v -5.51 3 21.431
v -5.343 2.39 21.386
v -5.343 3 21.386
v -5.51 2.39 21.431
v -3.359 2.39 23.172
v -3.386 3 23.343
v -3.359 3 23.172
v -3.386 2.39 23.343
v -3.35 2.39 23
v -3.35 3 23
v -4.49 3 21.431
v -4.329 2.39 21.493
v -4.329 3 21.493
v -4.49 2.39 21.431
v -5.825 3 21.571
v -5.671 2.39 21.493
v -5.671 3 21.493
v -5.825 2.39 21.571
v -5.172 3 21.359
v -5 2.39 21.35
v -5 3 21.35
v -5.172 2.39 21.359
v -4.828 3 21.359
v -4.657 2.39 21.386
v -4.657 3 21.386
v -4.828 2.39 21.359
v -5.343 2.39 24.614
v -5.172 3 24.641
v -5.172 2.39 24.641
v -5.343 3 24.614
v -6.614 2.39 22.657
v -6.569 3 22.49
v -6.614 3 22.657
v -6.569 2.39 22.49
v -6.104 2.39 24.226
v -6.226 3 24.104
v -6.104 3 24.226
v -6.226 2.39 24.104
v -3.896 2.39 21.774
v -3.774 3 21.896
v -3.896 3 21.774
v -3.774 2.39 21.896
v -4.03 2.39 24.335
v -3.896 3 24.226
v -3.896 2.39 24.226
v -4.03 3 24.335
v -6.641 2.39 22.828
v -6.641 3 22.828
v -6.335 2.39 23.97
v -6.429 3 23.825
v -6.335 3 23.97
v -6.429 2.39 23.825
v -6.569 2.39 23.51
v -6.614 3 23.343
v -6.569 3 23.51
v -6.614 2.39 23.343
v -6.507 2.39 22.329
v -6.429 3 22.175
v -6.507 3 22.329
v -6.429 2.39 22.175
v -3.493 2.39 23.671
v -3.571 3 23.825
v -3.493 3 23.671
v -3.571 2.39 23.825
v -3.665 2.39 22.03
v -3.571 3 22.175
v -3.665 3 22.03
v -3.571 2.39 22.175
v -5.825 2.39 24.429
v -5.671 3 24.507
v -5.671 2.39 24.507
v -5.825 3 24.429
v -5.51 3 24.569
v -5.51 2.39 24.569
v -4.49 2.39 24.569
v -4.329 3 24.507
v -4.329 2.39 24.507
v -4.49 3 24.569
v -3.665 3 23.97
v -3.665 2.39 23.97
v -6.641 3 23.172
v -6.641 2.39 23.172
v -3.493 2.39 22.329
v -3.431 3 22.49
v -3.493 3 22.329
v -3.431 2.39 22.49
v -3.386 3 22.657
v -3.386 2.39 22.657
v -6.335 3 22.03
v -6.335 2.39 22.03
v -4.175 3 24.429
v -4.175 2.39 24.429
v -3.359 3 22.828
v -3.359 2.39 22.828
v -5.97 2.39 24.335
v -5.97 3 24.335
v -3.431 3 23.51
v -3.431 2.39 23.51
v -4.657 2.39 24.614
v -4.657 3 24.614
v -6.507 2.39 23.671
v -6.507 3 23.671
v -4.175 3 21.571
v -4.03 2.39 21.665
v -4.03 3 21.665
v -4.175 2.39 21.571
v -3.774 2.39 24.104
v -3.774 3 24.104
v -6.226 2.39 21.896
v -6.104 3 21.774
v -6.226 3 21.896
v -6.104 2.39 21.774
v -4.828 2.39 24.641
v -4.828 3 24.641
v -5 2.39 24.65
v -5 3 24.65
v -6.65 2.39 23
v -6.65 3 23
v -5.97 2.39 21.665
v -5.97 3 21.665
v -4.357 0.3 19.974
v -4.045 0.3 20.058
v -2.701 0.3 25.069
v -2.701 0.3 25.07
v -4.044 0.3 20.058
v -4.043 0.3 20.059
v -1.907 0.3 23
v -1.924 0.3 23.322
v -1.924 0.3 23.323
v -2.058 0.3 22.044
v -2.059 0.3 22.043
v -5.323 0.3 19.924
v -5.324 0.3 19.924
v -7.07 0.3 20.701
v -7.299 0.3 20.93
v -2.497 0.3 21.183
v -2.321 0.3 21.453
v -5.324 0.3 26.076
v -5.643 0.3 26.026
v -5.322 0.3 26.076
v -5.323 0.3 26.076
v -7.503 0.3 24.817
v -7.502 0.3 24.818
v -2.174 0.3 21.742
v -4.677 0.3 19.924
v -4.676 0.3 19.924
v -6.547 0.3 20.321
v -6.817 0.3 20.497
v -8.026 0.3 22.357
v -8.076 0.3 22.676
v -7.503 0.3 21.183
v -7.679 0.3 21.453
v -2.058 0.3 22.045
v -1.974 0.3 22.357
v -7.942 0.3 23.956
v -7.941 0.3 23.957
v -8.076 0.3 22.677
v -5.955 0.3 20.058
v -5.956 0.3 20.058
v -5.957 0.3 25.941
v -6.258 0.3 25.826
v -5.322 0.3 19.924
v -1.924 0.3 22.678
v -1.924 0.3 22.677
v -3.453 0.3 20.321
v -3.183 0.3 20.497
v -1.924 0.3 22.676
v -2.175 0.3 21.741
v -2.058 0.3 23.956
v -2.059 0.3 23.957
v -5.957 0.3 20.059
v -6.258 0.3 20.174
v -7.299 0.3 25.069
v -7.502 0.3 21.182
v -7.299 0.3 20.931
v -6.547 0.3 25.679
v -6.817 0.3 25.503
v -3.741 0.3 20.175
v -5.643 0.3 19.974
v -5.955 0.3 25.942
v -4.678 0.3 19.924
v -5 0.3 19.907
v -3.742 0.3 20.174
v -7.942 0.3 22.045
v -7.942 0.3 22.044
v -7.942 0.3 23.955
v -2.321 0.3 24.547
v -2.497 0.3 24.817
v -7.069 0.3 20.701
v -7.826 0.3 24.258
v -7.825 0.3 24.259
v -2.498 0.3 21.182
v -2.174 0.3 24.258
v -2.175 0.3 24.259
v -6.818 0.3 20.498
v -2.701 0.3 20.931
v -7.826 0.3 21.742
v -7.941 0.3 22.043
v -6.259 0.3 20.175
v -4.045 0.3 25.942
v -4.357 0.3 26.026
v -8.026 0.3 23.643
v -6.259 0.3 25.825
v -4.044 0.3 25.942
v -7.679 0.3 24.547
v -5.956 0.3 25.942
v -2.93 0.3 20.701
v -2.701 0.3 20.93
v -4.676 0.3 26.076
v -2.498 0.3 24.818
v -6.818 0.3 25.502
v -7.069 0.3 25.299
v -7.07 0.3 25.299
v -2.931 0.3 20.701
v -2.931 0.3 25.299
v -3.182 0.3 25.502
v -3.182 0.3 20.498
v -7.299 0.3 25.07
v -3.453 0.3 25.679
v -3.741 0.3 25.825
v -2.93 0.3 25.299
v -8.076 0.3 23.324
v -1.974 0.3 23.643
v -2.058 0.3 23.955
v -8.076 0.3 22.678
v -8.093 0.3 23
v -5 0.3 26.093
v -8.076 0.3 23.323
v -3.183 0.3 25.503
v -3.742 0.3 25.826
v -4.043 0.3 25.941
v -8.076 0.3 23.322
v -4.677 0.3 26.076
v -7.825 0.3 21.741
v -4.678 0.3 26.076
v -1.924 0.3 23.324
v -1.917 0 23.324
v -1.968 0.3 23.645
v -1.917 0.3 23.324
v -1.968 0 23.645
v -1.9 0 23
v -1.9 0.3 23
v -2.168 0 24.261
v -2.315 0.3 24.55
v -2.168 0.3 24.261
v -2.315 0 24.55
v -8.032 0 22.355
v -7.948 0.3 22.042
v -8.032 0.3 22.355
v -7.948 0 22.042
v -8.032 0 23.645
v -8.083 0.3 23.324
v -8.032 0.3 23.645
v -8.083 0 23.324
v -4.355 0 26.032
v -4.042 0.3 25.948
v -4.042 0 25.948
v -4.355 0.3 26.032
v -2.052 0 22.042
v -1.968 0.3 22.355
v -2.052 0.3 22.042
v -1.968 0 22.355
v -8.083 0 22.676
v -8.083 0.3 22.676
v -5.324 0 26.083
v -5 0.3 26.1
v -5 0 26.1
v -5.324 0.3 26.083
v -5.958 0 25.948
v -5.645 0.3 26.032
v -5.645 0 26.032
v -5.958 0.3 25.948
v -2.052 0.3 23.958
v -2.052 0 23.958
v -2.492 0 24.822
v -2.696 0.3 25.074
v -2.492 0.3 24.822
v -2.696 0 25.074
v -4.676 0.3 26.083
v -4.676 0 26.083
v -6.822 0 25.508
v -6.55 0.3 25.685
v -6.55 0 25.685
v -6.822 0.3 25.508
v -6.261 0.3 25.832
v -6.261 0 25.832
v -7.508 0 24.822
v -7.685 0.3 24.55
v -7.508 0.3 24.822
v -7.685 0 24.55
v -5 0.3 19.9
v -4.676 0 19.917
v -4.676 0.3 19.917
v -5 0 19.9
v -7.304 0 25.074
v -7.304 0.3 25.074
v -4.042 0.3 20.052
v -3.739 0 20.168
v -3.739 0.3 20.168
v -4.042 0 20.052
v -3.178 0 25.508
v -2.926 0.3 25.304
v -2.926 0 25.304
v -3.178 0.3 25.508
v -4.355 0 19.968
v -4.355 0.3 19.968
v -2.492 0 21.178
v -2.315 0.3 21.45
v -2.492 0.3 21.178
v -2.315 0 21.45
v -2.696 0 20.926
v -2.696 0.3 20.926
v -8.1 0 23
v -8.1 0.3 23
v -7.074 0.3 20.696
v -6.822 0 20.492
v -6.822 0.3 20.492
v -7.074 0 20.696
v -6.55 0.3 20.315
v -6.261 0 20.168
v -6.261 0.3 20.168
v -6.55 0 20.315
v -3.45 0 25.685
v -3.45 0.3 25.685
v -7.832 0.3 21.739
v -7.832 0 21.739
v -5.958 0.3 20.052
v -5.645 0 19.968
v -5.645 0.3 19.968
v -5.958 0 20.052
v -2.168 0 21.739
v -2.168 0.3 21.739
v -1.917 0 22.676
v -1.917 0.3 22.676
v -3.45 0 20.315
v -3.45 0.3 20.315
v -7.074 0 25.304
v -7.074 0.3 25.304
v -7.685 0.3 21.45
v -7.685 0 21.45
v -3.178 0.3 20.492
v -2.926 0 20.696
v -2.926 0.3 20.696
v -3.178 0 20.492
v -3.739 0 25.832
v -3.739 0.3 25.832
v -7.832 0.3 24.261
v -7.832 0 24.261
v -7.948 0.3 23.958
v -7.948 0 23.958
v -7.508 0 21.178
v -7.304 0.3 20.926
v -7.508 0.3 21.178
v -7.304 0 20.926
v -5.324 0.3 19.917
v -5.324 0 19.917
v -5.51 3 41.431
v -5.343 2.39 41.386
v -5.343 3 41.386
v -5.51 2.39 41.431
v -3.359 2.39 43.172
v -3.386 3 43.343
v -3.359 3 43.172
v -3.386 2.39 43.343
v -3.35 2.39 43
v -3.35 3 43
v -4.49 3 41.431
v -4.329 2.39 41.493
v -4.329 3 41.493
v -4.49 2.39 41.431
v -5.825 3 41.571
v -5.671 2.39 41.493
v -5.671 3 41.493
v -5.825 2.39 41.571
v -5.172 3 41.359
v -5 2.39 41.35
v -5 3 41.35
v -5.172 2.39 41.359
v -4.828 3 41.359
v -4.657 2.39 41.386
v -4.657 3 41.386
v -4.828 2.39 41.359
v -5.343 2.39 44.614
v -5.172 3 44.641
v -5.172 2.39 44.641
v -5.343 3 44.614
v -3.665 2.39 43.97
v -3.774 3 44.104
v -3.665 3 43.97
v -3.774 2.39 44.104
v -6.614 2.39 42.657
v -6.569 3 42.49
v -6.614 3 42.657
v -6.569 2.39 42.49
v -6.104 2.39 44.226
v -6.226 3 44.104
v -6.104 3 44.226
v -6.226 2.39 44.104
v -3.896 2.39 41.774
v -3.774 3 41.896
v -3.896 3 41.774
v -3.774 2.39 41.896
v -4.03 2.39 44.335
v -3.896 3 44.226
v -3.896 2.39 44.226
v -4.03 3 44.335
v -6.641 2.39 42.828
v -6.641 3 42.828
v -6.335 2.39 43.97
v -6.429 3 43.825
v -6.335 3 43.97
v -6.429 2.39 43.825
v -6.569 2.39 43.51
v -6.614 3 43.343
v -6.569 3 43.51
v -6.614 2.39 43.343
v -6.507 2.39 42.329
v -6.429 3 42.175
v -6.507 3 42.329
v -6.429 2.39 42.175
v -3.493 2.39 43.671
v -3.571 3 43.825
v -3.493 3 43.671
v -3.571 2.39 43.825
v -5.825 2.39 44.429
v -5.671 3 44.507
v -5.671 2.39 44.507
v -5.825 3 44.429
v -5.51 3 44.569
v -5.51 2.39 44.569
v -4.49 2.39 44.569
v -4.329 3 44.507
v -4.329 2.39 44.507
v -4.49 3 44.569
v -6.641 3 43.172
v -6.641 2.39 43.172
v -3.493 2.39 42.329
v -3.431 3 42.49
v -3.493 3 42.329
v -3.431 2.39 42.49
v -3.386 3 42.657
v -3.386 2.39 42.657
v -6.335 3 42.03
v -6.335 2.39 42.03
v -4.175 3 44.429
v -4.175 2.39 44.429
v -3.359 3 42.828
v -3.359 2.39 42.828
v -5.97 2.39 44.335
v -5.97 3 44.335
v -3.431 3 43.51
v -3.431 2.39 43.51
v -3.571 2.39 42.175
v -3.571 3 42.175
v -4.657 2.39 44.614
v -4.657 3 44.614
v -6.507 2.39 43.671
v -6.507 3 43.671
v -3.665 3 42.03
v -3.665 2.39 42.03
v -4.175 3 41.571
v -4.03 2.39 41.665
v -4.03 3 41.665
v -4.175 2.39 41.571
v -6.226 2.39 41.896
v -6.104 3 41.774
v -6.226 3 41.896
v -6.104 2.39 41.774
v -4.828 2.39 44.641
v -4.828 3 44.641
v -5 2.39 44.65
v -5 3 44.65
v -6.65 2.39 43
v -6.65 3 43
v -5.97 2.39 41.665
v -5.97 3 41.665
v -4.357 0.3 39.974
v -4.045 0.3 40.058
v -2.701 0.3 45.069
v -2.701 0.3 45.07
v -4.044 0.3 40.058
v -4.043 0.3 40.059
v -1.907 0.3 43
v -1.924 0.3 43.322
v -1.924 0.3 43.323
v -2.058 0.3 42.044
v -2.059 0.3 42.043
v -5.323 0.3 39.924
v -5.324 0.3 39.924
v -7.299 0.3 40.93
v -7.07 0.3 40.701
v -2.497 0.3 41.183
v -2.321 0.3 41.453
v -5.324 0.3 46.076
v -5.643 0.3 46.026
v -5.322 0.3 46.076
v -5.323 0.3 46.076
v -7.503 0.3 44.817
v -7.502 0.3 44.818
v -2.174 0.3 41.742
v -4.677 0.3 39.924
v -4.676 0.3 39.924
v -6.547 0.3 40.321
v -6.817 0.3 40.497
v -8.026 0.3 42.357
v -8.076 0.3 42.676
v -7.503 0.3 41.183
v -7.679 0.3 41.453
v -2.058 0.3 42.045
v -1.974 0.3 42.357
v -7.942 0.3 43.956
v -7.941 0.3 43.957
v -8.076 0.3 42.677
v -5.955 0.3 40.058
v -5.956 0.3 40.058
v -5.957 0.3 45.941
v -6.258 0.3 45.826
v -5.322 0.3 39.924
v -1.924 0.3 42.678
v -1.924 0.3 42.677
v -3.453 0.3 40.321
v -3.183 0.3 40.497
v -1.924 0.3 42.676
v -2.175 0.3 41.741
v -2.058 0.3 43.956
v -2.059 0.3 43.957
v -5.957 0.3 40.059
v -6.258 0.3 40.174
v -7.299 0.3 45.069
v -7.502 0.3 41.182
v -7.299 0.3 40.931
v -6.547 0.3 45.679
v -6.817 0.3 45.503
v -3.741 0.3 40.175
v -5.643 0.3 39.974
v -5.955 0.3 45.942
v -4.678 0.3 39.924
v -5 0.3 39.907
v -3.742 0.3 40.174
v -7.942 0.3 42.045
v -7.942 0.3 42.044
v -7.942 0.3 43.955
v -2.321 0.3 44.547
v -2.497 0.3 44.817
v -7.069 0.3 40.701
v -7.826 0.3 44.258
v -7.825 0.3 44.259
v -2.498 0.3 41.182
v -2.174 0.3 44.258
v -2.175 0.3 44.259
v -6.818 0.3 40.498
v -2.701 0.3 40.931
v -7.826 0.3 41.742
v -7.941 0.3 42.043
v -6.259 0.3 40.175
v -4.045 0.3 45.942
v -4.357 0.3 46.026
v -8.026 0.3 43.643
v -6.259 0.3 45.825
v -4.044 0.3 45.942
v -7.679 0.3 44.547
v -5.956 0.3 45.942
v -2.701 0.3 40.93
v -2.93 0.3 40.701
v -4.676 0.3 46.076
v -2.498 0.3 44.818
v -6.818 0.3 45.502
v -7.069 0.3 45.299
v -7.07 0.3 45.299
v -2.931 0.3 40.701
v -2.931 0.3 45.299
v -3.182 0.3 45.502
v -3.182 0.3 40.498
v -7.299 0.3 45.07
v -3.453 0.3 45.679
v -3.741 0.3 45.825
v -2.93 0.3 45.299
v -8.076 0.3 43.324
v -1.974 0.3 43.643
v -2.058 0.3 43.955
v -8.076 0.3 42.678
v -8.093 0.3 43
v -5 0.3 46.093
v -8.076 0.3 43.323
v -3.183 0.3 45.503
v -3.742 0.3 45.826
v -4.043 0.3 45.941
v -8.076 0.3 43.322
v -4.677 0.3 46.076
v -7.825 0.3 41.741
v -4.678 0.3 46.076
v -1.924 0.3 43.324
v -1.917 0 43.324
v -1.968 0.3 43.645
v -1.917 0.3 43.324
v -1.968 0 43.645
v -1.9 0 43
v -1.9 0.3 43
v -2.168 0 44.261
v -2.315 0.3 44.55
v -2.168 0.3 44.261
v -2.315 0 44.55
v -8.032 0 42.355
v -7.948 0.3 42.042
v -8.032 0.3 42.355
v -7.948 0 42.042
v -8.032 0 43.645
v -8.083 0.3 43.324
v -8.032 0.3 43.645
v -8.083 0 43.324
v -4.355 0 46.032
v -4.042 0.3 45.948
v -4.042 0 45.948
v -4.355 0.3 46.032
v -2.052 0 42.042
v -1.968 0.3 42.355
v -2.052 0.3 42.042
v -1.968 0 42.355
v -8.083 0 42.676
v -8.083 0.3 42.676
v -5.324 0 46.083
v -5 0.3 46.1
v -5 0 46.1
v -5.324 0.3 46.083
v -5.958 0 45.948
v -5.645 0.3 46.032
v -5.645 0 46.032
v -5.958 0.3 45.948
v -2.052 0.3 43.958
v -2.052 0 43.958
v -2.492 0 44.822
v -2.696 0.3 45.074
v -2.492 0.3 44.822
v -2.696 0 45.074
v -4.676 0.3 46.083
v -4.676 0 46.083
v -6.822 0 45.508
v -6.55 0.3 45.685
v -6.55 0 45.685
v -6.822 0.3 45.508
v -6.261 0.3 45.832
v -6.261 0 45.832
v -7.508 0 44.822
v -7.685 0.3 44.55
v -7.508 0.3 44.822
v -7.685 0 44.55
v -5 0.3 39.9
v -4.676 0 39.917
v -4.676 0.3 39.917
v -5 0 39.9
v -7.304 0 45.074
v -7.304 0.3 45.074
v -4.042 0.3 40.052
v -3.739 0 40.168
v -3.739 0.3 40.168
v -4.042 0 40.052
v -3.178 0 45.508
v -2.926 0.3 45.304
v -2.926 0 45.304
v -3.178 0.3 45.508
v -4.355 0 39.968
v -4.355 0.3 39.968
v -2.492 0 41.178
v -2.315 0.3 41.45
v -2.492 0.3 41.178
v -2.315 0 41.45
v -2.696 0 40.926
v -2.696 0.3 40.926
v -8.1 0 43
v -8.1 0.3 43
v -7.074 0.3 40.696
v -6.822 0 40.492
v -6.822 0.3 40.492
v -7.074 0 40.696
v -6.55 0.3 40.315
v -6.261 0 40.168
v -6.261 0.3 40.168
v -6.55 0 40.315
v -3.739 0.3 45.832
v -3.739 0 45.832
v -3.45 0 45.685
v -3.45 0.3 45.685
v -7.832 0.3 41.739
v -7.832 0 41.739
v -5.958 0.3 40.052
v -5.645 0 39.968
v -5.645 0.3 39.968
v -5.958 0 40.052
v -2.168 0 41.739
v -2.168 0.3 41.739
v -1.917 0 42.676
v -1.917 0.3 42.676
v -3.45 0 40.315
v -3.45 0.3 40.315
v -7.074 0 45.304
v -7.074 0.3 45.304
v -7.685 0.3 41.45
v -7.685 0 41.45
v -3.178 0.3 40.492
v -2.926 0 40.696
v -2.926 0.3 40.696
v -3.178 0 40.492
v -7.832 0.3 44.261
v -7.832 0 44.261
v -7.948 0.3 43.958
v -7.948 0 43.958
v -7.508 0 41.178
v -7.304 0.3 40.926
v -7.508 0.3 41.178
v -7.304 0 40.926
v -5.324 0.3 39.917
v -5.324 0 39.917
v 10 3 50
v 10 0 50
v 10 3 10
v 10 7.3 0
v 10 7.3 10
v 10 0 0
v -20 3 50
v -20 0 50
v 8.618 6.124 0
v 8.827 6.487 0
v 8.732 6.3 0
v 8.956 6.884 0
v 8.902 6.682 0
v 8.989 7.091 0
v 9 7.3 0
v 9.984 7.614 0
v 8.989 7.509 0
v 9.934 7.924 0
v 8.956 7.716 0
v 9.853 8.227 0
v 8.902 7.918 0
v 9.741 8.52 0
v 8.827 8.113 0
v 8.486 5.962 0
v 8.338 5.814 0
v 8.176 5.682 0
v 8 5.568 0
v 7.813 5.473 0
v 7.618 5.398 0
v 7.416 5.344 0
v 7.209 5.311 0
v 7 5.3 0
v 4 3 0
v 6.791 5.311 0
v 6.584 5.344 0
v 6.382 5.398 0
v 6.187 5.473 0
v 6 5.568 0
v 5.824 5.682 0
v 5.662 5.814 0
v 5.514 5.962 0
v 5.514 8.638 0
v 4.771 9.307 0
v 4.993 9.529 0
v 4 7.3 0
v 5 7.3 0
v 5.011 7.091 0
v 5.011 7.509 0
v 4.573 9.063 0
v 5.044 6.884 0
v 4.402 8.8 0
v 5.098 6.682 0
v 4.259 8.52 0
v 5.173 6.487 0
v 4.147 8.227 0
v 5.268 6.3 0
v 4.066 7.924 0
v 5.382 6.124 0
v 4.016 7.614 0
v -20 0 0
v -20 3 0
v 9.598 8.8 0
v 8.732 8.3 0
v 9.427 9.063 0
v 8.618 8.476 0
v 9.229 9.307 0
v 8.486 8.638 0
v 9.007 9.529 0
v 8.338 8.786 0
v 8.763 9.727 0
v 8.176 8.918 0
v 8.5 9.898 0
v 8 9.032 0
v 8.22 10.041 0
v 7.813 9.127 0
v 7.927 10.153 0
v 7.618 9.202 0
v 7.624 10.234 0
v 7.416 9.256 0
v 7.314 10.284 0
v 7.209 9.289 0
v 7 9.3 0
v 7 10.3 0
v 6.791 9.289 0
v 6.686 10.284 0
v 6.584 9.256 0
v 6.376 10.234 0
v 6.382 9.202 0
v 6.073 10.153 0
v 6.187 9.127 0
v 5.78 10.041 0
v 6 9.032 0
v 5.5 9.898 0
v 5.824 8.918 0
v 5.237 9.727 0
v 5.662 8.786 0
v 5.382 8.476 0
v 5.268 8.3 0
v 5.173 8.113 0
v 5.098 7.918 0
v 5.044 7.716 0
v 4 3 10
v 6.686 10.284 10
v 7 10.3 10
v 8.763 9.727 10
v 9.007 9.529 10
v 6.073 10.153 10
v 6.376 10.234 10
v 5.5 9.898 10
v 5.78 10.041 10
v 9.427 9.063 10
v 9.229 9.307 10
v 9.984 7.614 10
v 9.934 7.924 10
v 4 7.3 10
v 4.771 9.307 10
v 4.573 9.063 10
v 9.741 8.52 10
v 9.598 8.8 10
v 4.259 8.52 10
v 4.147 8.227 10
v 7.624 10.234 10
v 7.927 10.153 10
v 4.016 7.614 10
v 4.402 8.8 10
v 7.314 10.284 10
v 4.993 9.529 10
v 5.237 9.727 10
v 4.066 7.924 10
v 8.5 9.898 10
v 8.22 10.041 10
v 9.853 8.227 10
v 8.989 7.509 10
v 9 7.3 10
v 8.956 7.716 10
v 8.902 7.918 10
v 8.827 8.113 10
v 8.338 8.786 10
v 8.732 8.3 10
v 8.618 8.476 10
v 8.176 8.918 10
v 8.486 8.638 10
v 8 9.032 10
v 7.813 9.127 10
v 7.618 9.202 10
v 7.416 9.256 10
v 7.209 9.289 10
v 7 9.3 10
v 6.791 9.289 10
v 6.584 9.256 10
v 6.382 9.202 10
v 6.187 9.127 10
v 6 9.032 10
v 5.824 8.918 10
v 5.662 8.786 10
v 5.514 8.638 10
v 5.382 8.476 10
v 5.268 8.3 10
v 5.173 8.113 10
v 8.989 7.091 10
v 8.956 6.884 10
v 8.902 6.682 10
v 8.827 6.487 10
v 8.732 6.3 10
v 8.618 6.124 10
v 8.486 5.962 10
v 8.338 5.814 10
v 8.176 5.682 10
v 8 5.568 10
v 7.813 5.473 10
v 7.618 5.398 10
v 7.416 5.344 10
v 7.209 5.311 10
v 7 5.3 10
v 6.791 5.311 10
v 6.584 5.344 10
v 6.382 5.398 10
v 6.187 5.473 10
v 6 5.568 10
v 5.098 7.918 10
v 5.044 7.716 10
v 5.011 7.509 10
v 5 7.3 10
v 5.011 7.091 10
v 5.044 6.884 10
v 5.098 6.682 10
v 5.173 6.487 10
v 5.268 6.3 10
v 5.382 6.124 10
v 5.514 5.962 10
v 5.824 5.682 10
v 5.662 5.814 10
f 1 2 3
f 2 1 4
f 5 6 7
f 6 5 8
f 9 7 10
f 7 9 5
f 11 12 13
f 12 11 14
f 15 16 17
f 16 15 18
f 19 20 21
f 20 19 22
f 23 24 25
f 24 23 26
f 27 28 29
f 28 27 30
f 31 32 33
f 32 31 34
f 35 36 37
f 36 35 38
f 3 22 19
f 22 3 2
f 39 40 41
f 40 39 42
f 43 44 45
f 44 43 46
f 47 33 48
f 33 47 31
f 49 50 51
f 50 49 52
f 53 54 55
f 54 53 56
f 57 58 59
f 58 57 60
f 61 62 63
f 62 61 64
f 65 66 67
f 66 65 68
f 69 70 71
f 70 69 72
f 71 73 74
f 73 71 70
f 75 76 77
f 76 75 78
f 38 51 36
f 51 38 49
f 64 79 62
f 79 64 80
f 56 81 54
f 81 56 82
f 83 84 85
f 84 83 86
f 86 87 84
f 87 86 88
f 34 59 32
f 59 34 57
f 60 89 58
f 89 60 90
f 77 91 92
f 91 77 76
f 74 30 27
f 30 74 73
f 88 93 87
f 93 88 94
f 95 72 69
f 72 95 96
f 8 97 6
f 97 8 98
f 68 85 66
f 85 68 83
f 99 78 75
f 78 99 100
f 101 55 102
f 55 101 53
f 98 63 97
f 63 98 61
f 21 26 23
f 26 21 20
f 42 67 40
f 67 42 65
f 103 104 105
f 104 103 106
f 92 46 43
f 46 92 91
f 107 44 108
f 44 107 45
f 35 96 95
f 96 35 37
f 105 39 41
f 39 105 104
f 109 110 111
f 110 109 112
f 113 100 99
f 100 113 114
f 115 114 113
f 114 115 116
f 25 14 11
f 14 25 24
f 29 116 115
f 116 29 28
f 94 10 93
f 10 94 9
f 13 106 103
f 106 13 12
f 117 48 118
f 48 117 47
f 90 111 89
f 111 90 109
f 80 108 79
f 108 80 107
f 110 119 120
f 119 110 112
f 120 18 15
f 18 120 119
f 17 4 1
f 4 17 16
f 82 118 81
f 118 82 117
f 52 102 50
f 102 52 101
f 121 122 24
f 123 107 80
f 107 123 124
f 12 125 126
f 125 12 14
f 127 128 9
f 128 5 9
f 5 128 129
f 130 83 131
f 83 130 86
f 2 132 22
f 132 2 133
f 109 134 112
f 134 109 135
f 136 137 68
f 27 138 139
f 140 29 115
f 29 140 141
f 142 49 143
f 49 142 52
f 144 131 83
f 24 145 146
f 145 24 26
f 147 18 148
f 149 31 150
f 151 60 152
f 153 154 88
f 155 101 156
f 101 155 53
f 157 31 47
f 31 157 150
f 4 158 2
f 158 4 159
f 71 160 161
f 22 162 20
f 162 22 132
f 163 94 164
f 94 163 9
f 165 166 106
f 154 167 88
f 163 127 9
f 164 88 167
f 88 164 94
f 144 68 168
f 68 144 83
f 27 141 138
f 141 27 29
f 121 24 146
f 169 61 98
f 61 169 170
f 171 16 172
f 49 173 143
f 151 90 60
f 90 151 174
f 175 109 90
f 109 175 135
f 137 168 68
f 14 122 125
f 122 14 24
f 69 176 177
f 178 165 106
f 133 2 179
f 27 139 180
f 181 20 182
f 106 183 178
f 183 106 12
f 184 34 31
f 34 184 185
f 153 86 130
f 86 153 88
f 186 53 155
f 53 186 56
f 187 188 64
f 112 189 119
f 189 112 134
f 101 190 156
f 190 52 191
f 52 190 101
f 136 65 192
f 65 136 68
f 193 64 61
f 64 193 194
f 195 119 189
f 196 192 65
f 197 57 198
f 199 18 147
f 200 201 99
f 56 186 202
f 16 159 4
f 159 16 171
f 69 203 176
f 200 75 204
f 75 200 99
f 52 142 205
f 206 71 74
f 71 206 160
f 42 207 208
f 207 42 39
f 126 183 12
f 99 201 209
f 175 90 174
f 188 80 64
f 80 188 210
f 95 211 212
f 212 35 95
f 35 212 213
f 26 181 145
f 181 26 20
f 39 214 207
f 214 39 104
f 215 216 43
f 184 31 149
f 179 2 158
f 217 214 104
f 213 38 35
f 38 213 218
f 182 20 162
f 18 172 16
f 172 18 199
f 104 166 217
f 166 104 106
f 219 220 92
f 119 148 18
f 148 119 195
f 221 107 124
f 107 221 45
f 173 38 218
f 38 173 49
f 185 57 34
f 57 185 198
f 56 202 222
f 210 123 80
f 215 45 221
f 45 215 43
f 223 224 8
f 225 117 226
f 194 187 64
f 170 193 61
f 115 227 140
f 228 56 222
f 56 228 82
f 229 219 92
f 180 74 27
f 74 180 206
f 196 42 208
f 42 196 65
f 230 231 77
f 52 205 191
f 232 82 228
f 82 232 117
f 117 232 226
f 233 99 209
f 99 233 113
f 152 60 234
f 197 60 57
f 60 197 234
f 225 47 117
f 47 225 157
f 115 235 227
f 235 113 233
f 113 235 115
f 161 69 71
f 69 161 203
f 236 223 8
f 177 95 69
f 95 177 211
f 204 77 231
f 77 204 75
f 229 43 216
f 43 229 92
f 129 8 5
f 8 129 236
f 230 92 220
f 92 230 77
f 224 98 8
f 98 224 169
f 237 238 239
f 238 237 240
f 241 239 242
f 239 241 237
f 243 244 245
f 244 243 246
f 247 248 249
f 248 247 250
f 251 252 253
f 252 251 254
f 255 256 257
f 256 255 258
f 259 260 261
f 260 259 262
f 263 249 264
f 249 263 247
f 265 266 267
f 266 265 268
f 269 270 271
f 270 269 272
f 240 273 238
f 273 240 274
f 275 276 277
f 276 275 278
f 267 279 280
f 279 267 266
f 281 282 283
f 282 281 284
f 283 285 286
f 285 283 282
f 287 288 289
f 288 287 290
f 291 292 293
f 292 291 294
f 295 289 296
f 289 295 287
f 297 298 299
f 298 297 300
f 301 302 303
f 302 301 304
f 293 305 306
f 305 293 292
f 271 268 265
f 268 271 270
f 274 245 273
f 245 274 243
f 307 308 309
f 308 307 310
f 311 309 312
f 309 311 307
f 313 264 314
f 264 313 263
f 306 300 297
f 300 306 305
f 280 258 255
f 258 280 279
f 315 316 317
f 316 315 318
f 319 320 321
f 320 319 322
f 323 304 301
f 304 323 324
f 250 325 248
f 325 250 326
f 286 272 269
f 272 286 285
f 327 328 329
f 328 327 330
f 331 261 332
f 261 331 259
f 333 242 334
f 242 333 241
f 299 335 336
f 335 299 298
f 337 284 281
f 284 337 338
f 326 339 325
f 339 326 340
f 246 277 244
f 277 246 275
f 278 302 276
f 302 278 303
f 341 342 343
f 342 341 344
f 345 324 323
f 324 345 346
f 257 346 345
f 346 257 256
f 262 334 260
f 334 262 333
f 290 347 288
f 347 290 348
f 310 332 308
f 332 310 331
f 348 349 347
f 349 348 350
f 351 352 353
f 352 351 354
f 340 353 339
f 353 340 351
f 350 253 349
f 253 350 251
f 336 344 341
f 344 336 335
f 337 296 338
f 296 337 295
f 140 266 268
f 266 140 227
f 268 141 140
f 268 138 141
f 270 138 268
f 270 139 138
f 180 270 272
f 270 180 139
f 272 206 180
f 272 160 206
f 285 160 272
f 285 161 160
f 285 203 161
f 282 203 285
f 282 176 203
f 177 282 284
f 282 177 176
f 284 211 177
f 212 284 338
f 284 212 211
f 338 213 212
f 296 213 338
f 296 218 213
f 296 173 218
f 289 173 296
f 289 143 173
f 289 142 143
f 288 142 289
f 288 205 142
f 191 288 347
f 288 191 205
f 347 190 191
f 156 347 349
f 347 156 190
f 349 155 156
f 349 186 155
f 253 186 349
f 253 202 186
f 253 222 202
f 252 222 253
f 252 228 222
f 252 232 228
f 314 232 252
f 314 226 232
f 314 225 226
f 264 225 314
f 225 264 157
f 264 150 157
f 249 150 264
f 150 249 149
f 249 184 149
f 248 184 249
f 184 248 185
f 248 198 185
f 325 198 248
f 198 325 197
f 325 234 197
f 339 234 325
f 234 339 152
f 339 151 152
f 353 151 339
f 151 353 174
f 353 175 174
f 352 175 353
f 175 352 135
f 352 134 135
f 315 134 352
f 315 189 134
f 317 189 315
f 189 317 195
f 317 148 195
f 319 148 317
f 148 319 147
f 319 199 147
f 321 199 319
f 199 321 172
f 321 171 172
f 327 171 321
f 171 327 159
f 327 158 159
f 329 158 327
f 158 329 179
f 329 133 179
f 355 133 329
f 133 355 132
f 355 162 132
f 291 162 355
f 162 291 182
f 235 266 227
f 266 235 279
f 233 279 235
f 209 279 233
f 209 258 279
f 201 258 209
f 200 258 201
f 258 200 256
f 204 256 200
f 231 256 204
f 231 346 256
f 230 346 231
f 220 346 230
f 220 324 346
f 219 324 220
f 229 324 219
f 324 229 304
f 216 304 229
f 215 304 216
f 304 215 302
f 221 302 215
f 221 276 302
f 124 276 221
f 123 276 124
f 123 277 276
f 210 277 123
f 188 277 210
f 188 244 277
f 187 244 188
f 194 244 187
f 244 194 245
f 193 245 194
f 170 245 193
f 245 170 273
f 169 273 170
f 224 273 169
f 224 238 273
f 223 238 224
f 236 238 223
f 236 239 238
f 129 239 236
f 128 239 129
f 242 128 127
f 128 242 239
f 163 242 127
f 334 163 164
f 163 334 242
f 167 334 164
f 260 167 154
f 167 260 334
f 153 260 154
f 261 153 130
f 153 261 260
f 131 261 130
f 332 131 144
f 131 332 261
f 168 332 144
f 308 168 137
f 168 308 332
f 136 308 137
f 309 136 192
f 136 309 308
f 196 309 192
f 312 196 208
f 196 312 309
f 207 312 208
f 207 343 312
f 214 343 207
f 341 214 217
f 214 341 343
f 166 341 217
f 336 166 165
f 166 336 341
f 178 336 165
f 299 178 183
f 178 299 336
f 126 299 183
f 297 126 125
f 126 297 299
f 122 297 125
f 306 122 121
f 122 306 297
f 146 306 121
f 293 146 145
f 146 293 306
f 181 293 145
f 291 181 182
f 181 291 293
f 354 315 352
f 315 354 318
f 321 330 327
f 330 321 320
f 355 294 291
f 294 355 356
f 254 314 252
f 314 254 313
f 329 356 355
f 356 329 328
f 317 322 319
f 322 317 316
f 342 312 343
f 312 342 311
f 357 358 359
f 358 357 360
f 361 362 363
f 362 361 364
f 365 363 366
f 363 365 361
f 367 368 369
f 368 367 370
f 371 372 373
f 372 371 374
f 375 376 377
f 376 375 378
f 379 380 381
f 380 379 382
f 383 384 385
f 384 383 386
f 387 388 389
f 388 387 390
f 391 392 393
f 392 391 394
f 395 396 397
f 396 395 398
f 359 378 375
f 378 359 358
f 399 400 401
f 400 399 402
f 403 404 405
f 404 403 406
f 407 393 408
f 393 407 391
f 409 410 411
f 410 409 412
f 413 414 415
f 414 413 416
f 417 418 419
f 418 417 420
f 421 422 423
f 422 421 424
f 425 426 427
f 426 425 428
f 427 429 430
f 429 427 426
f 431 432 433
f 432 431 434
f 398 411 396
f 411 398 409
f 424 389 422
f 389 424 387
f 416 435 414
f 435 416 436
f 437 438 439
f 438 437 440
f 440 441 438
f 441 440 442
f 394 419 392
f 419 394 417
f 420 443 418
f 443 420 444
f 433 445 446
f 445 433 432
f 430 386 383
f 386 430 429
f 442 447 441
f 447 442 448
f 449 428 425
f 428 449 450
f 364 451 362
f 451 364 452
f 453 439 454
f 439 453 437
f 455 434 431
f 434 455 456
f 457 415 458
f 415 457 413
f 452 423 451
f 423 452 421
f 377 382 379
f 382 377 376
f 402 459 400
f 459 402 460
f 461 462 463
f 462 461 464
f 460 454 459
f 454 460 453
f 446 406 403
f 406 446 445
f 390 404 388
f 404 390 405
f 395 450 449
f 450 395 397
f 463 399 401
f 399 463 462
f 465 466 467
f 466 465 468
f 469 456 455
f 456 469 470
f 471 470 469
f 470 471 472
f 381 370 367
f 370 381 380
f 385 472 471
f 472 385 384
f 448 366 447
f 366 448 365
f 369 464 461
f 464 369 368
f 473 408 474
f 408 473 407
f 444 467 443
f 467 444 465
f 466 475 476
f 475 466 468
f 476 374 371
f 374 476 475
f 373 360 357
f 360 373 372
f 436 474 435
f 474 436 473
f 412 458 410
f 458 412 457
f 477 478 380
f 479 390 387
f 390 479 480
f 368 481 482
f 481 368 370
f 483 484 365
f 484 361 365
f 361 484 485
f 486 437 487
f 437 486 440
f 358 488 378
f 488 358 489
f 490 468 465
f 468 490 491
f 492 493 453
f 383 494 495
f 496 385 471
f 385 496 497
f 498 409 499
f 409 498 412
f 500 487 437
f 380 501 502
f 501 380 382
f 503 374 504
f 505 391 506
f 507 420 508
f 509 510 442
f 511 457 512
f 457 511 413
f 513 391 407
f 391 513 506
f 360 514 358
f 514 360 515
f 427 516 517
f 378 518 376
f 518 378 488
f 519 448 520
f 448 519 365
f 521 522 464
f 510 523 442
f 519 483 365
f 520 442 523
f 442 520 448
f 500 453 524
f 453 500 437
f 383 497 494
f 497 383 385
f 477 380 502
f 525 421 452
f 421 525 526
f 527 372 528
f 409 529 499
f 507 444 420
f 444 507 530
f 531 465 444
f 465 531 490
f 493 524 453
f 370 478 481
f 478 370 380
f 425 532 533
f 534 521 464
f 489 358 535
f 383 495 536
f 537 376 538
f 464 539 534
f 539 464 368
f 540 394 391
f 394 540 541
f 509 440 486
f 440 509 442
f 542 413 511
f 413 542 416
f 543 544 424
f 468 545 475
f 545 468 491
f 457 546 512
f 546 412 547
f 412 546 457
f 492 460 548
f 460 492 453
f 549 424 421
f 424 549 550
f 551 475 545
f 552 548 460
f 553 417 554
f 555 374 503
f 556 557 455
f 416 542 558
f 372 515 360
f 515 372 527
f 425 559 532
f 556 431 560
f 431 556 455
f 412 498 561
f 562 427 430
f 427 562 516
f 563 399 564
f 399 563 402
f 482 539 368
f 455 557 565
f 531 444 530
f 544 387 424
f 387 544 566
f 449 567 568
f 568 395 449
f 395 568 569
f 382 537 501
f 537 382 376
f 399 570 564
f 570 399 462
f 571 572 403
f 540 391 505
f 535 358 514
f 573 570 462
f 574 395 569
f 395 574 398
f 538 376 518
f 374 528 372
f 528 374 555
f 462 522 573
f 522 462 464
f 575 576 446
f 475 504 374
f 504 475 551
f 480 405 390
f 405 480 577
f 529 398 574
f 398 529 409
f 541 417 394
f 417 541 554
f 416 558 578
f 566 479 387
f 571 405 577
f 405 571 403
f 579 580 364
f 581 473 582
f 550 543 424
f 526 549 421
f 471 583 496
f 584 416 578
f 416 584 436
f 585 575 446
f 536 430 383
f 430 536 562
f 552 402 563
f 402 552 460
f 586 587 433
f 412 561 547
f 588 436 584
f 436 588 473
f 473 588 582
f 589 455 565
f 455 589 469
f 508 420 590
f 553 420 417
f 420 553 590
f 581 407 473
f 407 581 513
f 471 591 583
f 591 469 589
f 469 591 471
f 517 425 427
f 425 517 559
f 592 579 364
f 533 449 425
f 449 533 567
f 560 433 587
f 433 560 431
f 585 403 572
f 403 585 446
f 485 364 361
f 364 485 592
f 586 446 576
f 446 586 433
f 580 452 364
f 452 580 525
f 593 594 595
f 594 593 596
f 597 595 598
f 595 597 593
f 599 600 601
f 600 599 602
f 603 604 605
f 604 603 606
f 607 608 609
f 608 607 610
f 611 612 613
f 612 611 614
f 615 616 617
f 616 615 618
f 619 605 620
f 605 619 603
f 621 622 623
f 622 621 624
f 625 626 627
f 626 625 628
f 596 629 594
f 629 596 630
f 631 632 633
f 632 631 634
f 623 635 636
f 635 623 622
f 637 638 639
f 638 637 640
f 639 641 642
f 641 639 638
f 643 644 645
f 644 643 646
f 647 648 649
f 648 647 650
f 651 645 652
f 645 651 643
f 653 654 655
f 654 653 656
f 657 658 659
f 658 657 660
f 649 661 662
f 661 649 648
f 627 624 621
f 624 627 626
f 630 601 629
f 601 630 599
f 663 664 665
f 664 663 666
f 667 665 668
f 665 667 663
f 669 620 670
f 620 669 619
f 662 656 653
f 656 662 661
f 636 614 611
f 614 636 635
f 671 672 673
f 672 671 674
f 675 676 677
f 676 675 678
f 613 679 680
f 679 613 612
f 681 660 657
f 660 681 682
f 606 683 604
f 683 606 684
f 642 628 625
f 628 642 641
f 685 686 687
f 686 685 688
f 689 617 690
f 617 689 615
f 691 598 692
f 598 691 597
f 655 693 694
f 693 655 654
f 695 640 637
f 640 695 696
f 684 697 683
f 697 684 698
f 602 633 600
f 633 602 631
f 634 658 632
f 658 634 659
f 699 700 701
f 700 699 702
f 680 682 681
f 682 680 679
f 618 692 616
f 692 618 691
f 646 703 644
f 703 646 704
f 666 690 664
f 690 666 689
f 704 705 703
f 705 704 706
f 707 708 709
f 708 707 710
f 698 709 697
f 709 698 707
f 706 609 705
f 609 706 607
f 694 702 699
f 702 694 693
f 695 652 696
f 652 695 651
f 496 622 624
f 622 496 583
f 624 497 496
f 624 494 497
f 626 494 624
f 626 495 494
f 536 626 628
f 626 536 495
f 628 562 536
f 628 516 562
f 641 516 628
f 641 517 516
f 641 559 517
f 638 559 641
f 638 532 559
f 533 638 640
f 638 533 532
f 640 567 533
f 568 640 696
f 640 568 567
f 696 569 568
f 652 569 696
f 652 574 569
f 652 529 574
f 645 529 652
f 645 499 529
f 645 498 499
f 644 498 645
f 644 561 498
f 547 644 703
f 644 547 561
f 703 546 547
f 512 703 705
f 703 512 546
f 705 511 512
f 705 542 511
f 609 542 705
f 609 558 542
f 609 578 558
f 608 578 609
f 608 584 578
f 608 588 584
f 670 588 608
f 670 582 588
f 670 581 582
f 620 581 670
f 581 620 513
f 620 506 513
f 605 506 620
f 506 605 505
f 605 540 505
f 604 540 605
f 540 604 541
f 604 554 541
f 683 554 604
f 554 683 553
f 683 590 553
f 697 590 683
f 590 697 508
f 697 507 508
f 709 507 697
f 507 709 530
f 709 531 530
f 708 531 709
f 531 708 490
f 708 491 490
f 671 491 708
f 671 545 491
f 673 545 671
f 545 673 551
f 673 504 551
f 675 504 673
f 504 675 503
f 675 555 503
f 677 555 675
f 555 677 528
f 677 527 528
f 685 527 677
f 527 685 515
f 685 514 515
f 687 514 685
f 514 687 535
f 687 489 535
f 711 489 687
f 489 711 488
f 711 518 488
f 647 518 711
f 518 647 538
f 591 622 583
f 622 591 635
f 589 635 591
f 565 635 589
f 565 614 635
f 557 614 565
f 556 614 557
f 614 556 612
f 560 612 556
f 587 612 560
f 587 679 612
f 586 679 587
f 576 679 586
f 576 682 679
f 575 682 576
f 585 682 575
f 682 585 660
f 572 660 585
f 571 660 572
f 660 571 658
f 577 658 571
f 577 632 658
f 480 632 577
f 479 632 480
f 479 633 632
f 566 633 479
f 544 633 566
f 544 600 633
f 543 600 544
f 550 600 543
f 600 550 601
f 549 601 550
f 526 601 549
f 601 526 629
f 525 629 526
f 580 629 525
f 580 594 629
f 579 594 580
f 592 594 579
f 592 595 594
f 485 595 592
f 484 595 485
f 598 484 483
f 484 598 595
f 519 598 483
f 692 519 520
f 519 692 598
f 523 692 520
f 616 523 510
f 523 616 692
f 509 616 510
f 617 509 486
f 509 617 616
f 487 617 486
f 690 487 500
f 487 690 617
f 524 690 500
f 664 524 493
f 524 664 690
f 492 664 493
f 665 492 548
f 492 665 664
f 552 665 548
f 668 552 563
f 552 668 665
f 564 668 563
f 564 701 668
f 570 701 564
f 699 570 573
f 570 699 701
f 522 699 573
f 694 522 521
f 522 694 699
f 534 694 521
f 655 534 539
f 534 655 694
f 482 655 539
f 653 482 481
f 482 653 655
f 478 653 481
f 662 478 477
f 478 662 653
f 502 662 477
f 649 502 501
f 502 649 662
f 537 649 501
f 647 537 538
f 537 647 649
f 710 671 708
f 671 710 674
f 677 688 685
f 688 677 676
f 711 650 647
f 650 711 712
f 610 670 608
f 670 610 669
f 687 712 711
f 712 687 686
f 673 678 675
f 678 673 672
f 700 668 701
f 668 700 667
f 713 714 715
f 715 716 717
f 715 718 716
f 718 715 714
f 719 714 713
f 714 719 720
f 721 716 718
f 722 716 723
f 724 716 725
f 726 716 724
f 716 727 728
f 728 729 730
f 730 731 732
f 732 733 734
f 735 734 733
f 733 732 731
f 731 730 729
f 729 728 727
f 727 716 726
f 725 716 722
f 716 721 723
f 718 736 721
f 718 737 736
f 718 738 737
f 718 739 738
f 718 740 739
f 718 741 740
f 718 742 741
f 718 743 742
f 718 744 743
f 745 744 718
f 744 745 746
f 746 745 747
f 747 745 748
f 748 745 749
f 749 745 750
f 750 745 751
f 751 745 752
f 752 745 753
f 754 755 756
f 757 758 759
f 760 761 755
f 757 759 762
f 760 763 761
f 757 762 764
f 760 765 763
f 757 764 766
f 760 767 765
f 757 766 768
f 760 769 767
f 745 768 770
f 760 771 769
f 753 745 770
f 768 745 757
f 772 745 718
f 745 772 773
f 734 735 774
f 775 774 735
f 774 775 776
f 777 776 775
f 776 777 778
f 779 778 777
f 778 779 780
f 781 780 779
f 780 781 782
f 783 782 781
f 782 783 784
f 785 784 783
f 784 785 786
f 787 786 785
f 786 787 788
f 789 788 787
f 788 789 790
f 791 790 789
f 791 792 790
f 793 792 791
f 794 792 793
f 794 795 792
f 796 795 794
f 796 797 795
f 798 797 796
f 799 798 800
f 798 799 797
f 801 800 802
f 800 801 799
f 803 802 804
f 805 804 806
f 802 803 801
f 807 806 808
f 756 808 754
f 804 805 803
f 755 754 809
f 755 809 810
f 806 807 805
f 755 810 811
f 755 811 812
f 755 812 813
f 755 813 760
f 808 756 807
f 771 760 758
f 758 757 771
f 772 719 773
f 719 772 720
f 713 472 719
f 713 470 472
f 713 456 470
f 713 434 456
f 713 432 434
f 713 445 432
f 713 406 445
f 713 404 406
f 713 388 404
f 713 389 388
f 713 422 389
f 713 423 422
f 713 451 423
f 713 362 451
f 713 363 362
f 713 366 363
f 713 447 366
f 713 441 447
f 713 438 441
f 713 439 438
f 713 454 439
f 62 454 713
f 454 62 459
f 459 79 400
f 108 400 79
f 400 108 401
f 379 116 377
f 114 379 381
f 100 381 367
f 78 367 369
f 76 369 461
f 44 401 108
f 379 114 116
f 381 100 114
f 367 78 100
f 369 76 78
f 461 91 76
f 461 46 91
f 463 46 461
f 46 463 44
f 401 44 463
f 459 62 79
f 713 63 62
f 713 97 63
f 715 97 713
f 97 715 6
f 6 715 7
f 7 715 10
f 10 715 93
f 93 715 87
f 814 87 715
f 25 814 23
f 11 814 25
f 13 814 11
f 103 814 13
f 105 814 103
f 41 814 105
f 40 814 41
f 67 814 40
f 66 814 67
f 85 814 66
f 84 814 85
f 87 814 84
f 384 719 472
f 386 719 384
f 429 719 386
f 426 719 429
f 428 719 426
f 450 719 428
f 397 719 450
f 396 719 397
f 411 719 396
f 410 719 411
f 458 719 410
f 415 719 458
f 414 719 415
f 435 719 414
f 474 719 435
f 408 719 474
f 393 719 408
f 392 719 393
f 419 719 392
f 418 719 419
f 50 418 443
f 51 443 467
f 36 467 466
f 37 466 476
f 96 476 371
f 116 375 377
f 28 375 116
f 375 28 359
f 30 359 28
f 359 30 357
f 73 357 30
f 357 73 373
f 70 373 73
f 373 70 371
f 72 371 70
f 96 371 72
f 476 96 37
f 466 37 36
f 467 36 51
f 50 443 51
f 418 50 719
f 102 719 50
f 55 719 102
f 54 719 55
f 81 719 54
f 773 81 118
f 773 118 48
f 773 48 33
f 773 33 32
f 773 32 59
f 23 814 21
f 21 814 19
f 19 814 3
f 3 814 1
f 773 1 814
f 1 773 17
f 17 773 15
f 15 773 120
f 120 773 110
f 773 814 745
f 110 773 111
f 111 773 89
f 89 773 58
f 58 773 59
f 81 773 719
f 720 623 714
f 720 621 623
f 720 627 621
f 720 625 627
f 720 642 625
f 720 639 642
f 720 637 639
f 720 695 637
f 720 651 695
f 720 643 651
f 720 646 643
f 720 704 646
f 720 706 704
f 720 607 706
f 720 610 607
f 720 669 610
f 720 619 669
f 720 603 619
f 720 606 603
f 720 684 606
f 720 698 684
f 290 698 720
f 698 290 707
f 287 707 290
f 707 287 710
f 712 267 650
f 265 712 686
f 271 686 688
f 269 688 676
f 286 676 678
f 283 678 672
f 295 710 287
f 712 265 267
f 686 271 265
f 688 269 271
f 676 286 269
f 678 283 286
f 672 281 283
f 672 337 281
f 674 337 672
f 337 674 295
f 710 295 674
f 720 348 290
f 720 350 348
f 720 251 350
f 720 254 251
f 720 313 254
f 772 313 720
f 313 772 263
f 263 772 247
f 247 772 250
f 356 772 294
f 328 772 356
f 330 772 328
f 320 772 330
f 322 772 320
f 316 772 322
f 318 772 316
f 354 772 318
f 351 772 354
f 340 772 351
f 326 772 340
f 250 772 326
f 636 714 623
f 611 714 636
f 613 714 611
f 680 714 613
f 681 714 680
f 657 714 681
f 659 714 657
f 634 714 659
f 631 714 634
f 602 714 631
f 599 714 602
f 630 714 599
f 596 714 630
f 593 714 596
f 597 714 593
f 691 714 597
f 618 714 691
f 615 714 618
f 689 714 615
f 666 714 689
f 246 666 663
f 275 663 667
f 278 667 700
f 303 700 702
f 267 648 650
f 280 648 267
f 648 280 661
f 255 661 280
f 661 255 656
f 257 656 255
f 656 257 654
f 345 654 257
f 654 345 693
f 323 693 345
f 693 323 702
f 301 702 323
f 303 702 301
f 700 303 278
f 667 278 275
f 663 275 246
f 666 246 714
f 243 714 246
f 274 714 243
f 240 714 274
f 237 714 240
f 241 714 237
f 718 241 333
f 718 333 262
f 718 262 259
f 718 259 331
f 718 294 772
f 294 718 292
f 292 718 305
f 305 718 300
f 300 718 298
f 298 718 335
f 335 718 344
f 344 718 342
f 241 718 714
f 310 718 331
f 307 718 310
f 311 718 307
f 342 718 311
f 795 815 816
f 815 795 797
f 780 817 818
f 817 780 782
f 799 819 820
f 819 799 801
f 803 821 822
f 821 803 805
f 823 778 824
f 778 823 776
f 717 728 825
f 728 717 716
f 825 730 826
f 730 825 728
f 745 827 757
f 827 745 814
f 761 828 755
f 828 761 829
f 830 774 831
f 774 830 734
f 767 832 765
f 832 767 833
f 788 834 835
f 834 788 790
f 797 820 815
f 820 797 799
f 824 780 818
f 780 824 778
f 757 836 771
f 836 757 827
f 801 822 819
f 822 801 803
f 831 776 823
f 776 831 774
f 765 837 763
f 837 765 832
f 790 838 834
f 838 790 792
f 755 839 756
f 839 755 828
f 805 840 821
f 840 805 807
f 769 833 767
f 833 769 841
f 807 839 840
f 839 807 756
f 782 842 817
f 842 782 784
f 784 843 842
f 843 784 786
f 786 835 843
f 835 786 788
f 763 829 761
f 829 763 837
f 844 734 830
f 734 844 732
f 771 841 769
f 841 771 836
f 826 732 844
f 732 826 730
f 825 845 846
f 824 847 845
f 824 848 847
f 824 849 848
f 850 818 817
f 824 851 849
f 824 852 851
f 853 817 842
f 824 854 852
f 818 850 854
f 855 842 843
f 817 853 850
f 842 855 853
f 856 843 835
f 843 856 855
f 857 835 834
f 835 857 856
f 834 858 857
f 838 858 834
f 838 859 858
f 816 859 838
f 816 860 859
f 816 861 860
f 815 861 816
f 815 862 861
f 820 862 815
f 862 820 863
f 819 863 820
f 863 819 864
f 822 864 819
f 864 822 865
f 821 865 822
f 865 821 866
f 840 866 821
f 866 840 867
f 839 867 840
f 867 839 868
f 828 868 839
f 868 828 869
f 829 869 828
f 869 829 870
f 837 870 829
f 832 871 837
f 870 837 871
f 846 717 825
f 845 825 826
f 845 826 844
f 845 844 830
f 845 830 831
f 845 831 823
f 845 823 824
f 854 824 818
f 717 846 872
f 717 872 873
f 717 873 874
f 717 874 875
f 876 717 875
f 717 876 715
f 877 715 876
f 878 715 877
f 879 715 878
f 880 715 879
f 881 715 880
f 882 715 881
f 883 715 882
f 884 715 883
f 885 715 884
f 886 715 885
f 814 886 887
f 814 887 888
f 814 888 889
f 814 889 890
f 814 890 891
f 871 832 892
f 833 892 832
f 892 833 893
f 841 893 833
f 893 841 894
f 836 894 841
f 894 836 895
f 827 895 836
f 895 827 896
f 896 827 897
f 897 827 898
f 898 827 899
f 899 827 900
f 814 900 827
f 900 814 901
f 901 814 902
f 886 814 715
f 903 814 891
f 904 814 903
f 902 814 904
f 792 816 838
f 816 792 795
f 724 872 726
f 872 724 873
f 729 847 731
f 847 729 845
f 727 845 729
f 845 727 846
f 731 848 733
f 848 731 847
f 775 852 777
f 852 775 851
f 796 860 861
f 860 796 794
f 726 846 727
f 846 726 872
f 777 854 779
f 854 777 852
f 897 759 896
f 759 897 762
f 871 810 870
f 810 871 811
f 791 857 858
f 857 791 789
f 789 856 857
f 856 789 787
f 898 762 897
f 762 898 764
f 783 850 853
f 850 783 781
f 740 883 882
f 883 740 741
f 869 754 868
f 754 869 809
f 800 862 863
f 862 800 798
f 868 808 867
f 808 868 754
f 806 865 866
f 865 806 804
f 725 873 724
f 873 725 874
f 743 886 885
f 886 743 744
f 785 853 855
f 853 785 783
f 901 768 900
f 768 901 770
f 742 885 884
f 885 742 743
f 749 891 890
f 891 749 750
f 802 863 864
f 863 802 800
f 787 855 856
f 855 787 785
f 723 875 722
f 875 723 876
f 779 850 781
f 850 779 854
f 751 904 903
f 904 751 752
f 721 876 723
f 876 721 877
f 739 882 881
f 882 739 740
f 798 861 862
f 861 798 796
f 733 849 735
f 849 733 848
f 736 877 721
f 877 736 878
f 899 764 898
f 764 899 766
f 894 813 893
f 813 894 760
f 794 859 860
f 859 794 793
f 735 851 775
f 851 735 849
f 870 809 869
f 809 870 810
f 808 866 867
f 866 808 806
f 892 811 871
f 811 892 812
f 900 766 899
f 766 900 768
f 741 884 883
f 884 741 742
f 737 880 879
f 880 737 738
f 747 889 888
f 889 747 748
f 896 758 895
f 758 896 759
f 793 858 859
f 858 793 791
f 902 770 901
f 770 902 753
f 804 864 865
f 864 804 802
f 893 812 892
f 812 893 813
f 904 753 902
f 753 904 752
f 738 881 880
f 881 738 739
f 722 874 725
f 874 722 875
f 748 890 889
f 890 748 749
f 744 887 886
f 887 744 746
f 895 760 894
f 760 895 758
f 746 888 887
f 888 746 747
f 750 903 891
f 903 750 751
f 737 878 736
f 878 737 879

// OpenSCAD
//projection(cut=true)
//intersection(){
//  translate([10.5,-60,0])
//    import("../printer/Wanhao_D6_Clip_2.stl");
//  translate([4,-69.5,0])
//    import("../printer/Wanhao_D6_Clip_2.stl");
//  translate([0,-3,0]) cube([10,10,10], center=true);
//  cylinder(d=8,h=20);
//}
//  %cylinder(d=5,h=20);

//linear_extrude(18) import("d6_back_mount.dxf");

runout_mount();

module runout_mount(thickness=3){
  $fn=60;
  translate([5,1,0])
  linear_extrude(18) import("d6_back_mount.dxf");
  
  difference(){
    translate([-20,0,0]) cube([30,thickness,50]);
    for(Y=[0,1]) translate([-5,4+3.3,23+20*Y]){
        rotate([90,0,0]) cylinder(d=3.3, h=thickness*2);
      translate([0,-4.91,0]) 
        rotate([90,0,0]) cylinder(d1=3.3, d2=6.2, h=2.1);
      translate([0,-7,0]) 
        rotate([90,0,0]) cylinder(d=6.2, h=2);
    }
  }
  %translate([7,4+3.3,-2]) cylinder(d=2.5, h=40);
  translate([4+3,7.3,0]) 
  difference(){
    hull(){
      cylinder(d=6, h=10);
      translate([-3,-6,0]) cube([6,1,10]);
    }
    translate([0,0,-1]) cylinder(d=4, h=12);
//    translate([0,0,-1]) cylinder(d=4, h=10);
//    translate([0,0,8]) cylinder(d=3, h=5);
  }
}

module mount_test(){
difference(){
  $fn=60;
  cube([25,10,2], center=true);
  for(X=[-1,1]) translate([10*X,2,0]) cylinder(d=3.3, h=4, center=true);
  for(X=[-1,1]) translate([9*X,-2,0]) cylinder(d=3.3, h=4, center=true);
}
}
